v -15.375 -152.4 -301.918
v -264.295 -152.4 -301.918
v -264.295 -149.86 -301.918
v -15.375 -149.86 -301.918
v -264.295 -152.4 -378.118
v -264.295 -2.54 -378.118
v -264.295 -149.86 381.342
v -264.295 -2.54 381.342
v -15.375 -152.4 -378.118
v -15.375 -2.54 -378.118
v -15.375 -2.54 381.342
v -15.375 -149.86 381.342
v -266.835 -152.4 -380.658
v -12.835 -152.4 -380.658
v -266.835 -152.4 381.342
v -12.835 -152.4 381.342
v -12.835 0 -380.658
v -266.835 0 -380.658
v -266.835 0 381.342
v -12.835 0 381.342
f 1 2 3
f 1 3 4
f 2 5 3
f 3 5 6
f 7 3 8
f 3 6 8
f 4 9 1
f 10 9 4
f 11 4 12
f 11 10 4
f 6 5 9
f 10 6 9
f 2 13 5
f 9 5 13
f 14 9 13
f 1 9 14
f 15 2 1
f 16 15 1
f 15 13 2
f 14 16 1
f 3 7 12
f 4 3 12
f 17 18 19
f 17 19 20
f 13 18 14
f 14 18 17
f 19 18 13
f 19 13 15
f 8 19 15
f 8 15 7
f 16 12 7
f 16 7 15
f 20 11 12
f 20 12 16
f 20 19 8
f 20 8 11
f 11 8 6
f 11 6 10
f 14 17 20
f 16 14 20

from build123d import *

# Parameters (mm, degrees)
F0_W     = 254
F0_H     = 762
F1_DEPTH = 152.4
F3_T     = -2.54
F4_W     = 248.92
F4_H     = 76.2
F5_DEPTH = 12.7


with BuildPart() as f1:
    # F0 (on Front) → F1 (new body)
    with BuildSketch(Plane.XZ):
        with Locations((-139.834513, 0.342414)):
            Rectangle(F0_W, F0_H)
    extrude(amount=F1_DEPTH)

    # F3
    f3_openings = [f1.faces().sort_by_distance(p)[0] for p in [
        (-139.834513, -76.2, 381.342414),
    ]]
    offset(amount=F3_T, openings=f3_openings)

    # F4 (on face) → F5 (cut)
    with BuildSketch(Plane.XZ.offset(152.4)):
        with Locations((-139.834513, -340.017586)):
            Rectangle(F4_W, F4_H)
    extrude(amount=-F5_DEPTH, mode=Mode.SUBTRACT)


solid = f1.part
